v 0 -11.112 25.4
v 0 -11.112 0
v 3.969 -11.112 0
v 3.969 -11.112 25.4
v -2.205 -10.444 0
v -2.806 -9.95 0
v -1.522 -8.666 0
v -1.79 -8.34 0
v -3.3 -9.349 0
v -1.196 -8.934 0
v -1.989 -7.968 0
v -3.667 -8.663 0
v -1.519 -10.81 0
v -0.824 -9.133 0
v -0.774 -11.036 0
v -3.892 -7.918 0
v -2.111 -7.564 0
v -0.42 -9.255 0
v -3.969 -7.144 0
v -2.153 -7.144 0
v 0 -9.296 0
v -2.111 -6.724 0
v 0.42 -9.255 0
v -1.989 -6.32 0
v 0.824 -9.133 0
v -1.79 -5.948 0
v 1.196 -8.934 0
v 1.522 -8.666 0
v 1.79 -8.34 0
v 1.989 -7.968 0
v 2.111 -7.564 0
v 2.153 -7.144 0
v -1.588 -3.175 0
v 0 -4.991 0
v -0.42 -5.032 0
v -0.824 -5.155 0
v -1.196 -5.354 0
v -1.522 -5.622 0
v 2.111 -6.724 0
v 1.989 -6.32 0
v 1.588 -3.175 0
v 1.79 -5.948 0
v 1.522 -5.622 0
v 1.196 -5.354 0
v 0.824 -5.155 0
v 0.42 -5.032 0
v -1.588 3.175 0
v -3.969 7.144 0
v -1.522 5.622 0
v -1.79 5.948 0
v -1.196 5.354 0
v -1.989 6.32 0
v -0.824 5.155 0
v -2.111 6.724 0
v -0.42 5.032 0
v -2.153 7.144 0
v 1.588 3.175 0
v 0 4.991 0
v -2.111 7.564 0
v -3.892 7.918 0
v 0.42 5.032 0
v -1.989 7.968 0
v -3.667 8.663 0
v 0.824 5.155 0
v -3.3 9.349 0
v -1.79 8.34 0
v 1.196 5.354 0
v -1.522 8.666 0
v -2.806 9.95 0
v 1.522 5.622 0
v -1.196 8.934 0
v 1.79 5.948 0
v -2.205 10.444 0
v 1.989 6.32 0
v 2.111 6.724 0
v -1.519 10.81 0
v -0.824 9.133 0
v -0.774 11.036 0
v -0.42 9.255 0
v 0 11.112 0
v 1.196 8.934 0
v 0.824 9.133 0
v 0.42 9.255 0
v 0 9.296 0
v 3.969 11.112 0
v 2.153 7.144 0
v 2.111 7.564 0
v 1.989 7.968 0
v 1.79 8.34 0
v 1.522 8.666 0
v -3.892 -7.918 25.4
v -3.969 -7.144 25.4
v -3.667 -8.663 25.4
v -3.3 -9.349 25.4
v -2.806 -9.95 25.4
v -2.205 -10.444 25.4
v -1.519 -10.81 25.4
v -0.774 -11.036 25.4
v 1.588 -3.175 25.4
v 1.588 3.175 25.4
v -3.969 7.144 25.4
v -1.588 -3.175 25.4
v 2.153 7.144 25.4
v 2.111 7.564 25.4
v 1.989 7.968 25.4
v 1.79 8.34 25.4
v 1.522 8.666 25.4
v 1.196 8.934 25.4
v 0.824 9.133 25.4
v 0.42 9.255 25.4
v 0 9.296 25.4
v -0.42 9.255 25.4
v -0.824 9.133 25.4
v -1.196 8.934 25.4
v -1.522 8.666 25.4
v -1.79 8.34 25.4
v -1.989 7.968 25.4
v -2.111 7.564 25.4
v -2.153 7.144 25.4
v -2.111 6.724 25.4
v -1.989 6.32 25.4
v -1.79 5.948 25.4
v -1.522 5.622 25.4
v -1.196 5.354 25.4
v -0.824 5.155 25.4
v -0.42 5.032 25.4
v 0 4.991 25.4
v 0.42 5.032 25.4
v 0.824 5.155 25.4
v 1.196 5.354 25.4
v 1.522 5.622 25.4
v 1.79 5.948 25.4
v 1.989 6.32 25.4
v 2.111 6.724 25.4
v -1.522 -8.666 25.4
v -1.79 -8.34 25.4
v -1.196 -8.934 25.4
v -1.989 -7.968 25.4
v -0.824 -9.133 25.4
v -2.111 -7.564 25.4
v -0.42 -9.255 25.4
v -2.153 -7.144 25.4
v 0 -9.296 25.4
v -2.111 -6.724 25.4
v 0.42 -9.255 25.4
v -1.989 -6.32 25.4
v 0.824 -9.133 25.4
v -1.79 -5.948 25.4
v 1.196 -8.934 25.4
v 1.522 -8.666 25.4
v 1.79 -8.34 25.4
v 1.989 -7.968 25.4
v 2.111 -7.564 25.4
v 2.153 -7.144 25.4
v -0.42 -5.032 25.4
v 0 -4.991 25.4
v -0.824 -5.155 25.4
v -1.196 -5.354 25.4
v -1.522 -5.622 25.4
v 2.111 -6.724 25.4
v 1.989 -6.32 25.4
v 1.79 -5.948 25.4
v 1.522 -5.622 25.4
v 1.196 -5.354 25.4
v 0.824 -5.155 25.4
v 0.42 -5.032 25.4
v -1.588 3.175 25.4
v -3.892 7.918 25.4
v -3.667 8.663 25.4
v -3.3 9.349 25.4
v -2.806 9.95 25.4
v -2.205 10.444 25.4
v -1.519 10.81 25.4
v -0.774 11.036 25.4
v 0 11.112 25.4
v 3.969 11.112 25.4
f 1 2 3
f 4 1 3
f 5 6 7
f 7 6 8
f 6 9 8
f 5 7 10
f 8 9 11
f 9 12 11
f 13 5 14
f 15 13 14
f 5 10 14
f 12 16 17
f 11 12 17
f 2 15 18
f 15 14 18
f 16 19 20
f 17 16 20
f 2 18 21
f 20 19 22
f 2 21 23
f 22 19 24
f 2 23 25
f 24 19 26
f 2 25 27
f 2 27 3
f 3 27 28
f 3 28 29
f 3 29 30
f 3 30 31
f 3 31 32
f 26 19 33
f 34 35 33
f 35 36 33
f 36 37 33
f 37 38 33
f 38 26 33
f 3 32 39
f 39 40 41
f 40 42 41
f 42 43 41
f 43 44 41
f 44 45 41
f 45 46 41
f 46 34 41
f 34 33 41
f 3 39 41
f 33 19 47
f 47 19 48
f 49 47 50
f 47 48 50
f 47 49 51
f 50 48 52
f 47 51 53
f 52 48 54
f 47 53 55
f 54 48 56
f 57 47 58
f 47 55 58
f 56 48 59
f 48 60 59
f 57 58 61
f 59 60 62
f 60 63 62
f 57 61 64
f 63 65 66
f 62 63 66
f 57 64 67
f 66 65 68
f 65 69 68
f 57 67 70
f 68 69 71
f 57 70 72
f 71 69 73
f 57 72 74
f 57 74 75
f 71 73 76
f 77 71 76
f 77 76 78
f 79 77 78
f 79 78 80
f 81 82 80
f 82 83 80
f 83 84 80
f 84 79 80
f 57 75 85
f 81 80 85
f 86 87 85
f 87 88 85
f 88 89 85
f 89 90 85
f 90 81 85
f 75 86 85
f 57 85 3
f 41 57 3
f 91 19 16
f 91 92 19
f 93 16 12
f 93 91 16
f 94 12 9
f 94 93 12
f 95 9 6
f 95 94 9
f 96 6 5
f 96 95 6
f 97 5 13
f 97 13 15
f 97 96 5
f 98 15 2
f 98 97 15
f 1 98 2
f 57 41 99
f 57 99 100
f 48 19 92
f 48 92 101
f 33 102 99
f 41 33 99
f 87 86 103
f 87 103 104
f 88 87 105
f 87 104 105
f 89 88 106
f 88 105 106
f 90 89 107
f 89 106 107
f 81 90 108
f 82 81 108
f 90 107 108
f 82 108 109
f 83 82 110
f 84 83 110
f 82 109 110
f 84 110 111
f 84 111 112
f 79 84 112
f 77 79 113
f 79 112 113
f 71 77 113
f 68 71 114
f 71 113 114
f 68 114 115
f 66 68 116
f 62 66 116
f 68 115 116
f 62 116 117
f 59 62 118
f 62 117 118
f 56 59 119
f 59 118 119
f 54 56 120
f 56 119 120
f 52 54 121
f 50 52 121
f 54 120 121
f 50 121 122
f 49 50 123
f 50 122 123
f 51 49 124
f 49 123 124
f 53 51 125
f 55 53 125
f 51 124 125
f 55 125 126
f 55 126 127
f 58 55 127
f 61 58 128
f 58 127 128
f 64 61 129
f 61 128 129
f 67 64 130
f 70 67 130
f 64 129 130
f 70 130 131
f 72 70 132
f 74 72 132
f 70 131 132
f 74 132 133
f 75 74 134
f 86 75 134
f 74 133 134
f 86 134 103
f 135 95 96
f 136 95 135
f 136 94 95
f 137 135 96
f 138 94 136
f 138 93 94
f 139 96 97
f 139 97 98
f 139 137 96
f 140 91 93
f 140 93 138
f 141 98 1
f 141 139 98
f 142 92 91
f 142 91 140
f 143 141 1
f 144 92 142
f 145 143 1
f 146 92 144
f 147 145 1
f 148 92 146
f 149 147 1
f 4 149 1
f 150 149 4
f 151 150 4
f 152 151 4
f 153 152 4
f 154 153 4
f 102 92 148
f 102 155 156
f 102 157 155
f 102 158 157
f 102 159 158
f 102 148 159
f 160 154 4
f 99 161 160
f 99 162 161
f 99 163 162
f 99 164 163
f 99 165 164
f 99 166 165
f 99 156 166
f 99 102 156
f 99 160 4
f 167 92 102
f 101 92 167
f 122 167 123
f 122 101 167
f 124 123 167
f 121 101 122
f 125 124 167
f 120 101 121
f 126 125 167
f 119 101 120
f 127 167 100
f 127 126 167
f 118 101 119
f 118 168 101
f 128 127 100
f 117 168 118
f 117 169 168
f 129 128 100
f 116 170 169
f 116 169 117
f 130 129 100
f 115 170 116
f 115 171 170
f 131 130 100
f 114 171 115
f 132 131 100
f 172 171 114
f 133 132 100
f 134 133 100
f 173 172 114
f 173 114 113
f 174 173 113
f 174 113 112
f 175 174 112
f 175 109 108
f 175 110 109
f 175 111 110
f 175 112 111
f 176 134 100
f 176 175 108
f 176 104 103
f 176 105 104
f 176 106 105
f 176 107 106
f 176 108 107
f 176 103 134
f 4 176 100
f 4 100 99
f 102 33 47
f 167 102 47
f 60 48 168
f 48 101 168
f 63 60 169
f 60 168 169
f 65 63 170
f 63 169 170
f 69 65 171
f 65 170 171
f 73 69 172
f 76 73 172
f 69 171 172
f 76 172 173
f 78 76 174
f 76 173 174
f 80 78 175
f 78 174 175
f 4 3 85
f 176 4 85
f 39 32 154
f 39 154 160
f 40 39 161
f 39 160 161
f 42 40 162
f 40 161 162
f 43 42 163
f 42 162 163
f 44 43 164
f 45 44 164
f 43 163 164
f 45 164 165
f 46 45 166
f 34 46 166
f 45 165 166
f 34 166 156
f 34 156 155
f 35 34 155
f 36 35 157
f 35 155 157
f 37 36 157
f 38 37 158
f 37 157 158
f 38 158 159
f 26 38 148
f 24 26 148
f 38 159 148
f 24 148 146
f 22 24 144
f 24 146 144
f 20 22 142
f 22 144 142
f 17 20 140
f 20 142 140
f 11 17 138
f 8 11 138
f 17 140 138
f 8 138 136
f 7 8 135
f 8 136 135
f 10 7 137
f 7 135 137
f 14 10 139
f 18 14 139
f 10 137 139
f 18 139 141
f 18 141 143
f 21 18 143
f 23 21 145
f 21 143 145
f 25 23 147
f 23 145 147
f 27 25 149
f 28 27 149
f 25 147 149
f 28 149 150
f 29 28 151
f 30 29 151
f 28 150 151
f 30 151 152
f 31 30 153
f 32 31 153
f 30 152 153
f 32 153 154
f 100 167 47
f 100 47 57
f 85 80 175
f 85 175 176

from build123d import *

# Parameters (mm, degrees)
F0_W     = 7.9375
F0_H     = 22.225
F0_W_2   = 3.175
F0_H_2   = 6.35
F1_DEPTH = 25.4
F2_R     = 2.15265
F3_DEPTH = 25.4
F4_R     = 3.96875


with BuildPart() as f1:
    # F0 (on Top) → F1 (new body)
    with BuildSketch(Plane.XY):
        Rectangle(F0_W, F0_H)
        Rectangle(F0_W_2, F0_H_2, mode=Mode.SUBTRACT)
    extrude(amount=F1_DEPTH)

    # F2 (on face) → F3 (cut, through all)
    with BuildSketch(Plane.XY.offset(25.4)):
        with Locations((0, 7.14375)):
            Circle(F2_R)
        with Locations((0, -7.14375)):
            Circle(F2_R)
    extrude(amount=-F3_DEPTH, mode=Mode.SUBTRACT)

    # F4
    f4_edges = [f1.edges().sort_by_distance(p)[0] for p in [
        (-3.96875, -11.1125, 12.7),
        (-3.96875, 11.1125, 12.7),
    ]]
    fillet(f4_edges, radius=F4_R)


solid = f1.part
